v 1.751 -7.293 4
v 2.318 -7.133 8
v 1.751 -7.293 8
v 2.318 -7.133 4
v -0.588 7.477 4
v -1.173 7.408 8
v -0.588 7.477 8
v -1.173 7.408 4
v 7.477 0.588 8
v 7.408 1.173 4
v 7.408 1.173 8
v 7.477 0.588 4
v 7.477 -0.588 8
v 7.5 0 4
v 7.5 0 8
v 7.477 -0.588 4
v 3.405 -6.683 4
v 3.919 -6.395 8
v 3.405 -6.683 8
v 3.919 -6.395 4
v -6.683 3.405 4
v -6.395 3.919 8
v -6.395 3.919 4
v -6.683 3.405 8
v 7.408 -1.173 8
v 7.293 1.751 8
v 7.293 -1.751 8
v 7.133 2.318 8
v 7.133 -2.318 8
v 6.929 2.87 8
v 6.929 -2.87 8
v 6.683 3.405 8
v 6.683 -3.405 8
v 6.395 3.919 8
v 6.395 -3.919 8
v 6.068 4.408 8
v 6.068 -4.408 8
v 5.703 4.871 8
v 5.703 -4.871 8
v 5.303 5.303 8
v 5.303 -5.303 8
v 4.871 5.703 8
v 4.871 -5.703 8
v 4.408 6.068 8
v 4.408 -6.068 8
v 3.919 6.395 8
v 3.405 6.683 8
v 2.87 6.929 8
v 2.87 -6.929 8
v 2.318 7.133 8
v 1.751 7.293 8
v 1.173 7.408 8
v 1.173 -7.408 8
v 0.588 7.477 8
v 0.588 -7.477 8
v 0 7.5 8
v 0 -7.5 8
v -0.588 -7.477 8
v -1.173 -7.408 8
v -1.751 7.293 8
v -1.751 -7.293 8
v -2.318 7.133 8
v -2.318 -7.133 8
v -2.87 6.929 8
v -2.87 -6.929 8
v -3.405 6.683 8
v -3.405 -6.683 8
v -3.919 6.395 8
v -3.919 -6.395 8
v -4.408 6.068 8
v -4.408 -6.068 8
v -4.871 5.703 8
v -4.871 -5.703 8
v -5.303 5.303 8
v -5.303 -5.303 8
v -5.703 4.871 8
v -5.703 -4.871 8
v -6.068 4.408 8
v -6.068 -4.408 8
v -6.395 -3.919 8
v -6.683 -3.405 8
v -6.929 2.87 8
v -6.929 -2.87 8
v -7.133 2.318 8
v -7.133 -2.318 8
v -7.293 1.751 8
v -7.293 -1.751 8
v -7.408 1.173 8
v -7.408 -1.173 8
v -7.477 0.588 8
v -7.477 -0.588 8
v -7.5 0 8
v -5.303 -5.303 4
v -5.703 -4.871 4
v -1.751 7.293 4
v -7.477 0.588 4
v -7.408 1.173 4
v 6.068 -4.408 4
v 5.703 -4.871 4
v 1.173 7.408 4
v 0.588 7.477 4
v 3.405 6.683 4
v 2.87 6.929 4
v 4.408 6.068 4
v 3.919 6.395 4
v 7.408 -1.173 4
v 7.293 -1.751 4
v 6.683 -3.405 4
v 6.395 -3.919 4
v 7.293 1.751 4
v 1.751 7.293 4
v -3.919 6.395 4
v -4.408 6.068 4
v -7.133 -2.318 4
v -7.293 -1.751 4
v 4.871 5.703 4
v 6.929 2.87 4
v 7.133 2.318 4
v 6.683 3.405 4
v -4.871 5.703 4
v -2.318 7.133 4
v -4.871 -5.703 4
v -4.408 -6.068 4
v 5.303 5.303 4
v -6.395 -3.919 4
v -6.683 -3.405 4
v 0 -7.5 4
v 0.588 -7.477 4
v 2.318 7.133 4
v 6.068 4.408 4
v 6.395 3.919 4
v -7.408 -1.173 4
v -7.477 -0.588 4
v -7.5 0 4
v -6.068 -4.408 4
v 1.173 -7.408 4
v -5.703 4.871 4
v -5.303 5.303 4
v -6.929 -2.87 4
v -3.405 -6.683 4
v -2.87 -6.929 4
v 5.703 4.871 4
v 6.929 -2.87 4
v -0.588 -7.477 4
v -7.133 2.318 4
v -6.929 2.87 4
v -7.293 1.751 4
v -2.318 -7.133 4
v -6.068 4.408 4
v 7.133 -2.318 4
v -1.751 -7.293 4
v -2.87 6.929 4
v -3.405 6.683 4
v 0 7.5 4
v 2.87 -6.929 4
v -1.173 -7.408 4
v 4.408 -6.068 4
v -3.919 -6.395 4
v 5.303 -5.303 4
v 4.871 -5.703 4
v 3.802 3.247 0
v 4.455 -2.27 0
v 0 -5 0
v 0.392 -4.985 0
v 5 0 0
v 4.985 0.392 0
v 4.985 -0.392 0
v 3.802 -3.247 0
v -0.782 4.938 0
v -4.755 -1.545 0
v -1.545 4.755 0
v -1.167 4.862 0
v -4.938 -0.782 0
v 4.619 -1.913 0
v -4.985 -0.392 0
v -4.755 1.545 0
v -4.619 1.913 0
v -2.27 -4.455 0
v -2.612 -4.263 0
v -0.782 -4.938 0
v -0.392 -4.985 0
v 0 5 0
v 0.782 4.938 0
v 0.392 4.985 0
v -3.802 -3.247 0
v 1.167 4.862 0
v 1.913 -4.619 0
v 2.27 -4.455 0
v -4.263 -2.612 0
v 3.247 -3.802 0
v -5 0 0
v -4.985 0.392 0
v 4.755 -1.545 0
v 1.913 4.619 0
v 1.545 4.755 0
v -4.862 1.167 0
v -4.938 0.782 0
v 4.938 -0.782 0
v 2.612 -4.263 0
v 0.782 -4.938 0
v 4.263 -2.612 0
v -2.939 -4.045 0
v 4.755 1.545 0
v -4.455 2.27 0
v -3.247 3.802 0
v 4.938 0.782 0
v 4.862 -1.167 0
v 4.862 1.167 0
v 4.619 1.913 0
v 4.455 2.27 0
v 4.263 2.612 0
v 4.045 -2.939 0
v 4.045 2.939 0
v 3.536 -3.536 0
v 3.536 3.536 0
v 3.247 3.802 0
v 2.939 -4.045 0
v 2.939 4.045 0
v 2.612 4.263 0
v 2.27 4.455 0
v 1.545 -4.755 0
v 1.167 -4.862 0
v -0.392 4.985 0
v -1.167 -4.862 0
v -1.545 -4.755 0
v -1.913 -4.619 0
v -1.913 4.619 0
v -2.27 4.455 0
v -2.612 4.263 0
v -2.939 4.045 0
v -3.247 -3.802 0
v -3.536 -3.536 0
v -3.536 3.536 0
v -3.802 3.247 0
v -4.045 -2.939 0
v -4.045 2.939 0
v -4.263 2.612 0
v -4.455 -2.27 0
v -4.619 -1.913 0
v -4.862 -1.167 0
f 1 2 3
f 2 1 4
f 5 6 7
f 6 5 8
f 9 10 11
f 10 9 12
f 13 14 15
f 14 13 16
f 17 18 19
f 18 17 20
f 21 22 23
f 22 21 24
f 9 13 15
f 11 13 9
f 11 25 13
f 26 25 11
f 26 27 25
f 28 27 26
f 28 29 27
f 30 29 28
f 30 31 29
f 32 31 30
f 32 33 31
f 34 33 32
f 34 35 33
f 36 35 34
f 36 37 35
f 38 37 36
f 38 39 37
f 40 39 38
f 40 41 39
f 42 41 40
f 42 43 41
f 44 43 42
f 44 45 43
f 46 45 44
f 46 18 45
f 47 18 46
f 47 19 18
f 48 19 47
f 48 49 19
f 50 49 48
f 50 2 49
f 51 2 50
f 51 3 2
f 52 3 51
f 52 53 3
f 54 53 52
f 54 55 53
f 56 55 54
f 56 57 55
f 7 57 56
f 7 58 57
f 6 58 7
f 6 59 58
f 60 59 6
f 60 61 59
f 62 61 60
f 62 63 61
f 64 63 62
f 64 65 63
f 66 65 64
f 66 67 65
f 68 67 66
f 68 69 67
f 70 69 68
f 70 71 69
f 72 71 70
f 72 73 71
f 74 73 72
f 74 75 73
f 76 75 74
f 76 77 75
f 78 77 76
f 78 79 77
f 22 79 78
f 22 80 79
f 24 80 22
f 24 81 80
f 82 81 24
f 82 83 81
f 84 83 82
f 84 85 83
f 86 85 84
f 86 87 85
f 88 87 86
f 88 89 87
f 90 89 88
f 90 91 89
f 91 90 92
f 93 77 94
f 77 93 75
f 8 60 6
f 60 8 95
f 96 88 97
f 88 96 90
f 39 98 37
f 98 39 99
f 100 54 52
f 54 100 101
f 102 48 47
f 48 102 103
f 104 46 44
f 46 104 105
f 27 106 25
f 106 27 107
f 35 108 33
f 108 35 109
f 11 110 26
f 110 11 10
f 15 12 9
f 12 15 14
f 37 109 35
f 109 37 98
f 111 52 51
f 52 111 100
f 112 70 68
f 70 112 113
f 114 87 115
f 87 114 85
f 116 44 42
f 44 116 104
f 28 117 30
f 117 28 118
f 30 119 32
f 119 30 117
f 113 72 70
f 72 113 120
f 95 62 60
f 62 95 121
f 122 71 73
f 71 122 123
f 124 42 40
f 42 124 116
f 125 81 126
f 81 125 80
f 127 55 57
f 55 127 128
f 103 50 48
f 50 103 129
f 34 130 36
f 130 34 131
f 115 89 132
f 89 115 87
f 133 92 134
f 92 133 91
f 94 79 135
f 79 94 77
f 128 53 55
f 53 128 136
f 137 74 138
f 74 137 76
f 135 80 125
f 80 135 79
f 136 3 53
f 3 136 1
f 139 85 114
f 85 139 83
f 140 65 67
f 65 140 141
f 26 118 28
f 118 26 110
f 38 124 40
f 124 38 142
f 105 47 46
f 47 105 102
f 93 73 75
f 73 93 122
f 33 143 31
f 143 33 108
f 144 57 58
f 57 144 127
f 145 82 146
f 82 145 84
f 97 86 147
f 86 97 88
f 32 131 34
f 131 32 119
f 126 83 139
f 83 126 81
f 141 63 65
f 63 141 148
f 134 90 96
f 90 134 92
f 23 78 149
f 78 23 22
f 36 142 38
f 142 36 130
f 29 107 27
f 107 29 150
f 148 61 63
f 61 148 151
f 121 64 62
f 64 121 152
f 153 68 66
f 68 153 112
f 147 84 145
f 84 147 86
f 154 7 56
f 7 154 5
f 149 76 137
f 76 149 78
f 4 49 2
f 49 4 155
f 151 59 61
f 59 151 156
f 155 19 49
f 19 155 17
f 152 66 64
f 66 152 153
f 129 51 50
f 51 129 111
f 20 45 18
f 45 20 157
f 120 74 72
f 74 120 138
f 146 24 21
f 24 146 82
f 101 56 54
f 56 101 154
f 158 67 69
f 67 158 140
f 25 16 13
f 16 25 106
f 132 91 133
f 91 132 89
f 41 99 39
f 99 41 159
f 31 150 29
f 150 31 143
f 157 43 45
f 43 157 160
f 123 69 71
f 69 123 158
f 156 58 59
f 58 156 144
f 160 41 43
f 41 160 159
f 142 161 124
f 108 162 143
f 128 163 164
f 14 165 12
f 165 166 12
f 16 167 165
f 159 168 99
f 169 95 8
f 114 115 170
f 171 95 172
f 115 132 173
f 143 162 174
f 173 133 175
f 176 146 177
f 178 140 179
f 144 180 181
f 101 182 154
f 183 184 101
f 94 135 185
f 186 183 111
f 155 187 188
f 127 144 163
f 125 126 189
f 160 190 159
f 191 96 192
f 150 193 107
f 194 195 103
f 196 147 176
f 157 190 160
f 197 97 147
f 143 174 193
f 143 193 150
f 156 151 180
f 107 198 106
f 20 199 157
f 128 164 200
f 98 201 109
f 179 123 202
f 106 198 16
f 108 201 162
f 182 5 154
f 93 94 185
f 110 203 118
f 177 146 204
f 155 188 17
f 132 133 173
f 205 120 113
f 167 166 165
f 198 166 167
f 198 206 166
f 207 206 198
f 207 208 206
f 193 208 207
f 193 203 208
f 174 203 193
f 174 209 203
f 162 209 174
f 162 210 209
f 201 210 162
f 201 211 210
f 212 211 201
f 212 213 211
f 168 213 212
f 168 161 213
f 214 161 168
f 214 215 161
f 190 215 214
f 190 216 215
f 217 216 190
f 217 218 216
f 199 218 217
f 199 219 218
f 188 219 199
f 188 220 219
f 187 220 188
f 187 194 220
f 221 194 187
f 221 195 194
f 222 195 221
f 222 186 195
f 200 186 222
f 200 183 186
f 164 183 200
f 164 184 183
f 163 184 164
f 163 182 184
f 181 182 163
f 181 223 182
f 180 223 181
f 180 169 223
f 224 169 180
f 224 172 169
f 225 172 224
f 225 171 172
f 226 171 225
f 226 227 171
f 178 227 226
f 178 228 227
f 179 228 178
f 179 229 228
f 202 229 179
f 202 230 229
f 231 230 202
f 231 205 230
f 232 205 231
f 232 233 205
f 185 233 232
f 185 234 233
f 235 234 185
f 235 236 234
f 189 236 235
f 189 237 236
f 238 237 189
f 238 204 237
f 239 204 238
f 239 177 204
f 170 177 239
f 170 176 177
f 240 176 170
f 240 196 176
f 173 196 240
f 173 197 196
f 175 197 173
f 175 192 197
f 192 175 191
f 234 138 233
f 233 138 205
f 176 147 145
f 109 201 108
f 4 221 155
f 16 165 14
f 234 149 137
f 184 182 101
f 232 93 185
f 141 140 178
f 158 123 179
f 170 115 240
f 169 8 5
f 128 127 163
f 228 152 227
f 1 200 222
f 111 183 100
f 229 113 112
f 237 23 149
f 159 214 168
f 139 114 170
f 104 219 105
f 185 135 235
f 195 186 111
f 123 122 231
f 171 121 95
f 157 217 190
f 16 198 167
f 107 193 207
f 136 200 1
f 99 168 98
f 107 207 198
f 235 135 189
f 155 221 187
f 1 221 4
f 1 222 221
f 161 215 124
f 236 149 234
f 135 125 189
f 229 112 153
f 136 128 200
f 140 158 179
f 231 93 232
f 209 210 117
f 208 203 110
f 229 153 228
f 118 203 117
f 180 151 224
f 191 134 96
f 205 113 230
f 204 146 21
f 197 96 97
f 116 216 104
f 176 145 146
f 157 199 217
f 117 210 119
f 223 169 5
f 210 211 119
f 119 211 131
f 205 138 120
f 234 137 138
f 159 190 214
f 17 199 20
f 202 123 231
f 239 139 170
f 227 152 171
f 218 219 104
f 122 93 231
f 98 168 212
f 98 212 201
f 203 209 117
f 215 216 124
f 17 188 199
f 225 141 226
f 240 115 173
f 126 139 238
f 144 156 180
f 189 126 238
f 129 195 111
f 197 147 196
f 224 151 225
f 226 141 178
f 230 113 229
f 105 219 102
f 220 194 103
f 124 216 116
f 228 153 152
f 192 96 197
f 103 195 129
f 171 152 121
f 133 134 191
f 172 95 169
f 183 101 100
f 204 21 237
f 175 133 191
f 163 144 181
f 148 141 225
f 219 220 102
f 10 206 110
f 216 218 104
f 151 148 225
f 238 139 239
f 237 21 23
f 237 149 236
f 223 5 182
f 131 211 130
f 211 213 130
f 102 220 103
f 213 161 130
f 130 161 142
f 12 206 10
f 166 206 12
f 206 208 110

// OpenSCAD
// params
diameter=15;
inner_diameter= 10;
center_depth=8;
side_depth=4;
above_ground=true; 

// calculations
zdisplace = above_ground ? center_depth : 0;
radius = diameter/2;
inner_radius = inner_diameter/2;
cone_depth=center_depth-side_depth;


translate([0,0, zdisplace])  {
    // draw below ground...
    union() {
        translate([0,0, 0-side_depth/2]) {
          cylinder(h=side_depth,r=radius, $fn = 80, center=true);
        }
        translate([0,0, 0-(side_depth+(cone_depth/2))]) {
          cylinder(h=cone_depth,r1=inner_radius, r2=radius, $fn = 80, center=true);  
        }
    }
}
